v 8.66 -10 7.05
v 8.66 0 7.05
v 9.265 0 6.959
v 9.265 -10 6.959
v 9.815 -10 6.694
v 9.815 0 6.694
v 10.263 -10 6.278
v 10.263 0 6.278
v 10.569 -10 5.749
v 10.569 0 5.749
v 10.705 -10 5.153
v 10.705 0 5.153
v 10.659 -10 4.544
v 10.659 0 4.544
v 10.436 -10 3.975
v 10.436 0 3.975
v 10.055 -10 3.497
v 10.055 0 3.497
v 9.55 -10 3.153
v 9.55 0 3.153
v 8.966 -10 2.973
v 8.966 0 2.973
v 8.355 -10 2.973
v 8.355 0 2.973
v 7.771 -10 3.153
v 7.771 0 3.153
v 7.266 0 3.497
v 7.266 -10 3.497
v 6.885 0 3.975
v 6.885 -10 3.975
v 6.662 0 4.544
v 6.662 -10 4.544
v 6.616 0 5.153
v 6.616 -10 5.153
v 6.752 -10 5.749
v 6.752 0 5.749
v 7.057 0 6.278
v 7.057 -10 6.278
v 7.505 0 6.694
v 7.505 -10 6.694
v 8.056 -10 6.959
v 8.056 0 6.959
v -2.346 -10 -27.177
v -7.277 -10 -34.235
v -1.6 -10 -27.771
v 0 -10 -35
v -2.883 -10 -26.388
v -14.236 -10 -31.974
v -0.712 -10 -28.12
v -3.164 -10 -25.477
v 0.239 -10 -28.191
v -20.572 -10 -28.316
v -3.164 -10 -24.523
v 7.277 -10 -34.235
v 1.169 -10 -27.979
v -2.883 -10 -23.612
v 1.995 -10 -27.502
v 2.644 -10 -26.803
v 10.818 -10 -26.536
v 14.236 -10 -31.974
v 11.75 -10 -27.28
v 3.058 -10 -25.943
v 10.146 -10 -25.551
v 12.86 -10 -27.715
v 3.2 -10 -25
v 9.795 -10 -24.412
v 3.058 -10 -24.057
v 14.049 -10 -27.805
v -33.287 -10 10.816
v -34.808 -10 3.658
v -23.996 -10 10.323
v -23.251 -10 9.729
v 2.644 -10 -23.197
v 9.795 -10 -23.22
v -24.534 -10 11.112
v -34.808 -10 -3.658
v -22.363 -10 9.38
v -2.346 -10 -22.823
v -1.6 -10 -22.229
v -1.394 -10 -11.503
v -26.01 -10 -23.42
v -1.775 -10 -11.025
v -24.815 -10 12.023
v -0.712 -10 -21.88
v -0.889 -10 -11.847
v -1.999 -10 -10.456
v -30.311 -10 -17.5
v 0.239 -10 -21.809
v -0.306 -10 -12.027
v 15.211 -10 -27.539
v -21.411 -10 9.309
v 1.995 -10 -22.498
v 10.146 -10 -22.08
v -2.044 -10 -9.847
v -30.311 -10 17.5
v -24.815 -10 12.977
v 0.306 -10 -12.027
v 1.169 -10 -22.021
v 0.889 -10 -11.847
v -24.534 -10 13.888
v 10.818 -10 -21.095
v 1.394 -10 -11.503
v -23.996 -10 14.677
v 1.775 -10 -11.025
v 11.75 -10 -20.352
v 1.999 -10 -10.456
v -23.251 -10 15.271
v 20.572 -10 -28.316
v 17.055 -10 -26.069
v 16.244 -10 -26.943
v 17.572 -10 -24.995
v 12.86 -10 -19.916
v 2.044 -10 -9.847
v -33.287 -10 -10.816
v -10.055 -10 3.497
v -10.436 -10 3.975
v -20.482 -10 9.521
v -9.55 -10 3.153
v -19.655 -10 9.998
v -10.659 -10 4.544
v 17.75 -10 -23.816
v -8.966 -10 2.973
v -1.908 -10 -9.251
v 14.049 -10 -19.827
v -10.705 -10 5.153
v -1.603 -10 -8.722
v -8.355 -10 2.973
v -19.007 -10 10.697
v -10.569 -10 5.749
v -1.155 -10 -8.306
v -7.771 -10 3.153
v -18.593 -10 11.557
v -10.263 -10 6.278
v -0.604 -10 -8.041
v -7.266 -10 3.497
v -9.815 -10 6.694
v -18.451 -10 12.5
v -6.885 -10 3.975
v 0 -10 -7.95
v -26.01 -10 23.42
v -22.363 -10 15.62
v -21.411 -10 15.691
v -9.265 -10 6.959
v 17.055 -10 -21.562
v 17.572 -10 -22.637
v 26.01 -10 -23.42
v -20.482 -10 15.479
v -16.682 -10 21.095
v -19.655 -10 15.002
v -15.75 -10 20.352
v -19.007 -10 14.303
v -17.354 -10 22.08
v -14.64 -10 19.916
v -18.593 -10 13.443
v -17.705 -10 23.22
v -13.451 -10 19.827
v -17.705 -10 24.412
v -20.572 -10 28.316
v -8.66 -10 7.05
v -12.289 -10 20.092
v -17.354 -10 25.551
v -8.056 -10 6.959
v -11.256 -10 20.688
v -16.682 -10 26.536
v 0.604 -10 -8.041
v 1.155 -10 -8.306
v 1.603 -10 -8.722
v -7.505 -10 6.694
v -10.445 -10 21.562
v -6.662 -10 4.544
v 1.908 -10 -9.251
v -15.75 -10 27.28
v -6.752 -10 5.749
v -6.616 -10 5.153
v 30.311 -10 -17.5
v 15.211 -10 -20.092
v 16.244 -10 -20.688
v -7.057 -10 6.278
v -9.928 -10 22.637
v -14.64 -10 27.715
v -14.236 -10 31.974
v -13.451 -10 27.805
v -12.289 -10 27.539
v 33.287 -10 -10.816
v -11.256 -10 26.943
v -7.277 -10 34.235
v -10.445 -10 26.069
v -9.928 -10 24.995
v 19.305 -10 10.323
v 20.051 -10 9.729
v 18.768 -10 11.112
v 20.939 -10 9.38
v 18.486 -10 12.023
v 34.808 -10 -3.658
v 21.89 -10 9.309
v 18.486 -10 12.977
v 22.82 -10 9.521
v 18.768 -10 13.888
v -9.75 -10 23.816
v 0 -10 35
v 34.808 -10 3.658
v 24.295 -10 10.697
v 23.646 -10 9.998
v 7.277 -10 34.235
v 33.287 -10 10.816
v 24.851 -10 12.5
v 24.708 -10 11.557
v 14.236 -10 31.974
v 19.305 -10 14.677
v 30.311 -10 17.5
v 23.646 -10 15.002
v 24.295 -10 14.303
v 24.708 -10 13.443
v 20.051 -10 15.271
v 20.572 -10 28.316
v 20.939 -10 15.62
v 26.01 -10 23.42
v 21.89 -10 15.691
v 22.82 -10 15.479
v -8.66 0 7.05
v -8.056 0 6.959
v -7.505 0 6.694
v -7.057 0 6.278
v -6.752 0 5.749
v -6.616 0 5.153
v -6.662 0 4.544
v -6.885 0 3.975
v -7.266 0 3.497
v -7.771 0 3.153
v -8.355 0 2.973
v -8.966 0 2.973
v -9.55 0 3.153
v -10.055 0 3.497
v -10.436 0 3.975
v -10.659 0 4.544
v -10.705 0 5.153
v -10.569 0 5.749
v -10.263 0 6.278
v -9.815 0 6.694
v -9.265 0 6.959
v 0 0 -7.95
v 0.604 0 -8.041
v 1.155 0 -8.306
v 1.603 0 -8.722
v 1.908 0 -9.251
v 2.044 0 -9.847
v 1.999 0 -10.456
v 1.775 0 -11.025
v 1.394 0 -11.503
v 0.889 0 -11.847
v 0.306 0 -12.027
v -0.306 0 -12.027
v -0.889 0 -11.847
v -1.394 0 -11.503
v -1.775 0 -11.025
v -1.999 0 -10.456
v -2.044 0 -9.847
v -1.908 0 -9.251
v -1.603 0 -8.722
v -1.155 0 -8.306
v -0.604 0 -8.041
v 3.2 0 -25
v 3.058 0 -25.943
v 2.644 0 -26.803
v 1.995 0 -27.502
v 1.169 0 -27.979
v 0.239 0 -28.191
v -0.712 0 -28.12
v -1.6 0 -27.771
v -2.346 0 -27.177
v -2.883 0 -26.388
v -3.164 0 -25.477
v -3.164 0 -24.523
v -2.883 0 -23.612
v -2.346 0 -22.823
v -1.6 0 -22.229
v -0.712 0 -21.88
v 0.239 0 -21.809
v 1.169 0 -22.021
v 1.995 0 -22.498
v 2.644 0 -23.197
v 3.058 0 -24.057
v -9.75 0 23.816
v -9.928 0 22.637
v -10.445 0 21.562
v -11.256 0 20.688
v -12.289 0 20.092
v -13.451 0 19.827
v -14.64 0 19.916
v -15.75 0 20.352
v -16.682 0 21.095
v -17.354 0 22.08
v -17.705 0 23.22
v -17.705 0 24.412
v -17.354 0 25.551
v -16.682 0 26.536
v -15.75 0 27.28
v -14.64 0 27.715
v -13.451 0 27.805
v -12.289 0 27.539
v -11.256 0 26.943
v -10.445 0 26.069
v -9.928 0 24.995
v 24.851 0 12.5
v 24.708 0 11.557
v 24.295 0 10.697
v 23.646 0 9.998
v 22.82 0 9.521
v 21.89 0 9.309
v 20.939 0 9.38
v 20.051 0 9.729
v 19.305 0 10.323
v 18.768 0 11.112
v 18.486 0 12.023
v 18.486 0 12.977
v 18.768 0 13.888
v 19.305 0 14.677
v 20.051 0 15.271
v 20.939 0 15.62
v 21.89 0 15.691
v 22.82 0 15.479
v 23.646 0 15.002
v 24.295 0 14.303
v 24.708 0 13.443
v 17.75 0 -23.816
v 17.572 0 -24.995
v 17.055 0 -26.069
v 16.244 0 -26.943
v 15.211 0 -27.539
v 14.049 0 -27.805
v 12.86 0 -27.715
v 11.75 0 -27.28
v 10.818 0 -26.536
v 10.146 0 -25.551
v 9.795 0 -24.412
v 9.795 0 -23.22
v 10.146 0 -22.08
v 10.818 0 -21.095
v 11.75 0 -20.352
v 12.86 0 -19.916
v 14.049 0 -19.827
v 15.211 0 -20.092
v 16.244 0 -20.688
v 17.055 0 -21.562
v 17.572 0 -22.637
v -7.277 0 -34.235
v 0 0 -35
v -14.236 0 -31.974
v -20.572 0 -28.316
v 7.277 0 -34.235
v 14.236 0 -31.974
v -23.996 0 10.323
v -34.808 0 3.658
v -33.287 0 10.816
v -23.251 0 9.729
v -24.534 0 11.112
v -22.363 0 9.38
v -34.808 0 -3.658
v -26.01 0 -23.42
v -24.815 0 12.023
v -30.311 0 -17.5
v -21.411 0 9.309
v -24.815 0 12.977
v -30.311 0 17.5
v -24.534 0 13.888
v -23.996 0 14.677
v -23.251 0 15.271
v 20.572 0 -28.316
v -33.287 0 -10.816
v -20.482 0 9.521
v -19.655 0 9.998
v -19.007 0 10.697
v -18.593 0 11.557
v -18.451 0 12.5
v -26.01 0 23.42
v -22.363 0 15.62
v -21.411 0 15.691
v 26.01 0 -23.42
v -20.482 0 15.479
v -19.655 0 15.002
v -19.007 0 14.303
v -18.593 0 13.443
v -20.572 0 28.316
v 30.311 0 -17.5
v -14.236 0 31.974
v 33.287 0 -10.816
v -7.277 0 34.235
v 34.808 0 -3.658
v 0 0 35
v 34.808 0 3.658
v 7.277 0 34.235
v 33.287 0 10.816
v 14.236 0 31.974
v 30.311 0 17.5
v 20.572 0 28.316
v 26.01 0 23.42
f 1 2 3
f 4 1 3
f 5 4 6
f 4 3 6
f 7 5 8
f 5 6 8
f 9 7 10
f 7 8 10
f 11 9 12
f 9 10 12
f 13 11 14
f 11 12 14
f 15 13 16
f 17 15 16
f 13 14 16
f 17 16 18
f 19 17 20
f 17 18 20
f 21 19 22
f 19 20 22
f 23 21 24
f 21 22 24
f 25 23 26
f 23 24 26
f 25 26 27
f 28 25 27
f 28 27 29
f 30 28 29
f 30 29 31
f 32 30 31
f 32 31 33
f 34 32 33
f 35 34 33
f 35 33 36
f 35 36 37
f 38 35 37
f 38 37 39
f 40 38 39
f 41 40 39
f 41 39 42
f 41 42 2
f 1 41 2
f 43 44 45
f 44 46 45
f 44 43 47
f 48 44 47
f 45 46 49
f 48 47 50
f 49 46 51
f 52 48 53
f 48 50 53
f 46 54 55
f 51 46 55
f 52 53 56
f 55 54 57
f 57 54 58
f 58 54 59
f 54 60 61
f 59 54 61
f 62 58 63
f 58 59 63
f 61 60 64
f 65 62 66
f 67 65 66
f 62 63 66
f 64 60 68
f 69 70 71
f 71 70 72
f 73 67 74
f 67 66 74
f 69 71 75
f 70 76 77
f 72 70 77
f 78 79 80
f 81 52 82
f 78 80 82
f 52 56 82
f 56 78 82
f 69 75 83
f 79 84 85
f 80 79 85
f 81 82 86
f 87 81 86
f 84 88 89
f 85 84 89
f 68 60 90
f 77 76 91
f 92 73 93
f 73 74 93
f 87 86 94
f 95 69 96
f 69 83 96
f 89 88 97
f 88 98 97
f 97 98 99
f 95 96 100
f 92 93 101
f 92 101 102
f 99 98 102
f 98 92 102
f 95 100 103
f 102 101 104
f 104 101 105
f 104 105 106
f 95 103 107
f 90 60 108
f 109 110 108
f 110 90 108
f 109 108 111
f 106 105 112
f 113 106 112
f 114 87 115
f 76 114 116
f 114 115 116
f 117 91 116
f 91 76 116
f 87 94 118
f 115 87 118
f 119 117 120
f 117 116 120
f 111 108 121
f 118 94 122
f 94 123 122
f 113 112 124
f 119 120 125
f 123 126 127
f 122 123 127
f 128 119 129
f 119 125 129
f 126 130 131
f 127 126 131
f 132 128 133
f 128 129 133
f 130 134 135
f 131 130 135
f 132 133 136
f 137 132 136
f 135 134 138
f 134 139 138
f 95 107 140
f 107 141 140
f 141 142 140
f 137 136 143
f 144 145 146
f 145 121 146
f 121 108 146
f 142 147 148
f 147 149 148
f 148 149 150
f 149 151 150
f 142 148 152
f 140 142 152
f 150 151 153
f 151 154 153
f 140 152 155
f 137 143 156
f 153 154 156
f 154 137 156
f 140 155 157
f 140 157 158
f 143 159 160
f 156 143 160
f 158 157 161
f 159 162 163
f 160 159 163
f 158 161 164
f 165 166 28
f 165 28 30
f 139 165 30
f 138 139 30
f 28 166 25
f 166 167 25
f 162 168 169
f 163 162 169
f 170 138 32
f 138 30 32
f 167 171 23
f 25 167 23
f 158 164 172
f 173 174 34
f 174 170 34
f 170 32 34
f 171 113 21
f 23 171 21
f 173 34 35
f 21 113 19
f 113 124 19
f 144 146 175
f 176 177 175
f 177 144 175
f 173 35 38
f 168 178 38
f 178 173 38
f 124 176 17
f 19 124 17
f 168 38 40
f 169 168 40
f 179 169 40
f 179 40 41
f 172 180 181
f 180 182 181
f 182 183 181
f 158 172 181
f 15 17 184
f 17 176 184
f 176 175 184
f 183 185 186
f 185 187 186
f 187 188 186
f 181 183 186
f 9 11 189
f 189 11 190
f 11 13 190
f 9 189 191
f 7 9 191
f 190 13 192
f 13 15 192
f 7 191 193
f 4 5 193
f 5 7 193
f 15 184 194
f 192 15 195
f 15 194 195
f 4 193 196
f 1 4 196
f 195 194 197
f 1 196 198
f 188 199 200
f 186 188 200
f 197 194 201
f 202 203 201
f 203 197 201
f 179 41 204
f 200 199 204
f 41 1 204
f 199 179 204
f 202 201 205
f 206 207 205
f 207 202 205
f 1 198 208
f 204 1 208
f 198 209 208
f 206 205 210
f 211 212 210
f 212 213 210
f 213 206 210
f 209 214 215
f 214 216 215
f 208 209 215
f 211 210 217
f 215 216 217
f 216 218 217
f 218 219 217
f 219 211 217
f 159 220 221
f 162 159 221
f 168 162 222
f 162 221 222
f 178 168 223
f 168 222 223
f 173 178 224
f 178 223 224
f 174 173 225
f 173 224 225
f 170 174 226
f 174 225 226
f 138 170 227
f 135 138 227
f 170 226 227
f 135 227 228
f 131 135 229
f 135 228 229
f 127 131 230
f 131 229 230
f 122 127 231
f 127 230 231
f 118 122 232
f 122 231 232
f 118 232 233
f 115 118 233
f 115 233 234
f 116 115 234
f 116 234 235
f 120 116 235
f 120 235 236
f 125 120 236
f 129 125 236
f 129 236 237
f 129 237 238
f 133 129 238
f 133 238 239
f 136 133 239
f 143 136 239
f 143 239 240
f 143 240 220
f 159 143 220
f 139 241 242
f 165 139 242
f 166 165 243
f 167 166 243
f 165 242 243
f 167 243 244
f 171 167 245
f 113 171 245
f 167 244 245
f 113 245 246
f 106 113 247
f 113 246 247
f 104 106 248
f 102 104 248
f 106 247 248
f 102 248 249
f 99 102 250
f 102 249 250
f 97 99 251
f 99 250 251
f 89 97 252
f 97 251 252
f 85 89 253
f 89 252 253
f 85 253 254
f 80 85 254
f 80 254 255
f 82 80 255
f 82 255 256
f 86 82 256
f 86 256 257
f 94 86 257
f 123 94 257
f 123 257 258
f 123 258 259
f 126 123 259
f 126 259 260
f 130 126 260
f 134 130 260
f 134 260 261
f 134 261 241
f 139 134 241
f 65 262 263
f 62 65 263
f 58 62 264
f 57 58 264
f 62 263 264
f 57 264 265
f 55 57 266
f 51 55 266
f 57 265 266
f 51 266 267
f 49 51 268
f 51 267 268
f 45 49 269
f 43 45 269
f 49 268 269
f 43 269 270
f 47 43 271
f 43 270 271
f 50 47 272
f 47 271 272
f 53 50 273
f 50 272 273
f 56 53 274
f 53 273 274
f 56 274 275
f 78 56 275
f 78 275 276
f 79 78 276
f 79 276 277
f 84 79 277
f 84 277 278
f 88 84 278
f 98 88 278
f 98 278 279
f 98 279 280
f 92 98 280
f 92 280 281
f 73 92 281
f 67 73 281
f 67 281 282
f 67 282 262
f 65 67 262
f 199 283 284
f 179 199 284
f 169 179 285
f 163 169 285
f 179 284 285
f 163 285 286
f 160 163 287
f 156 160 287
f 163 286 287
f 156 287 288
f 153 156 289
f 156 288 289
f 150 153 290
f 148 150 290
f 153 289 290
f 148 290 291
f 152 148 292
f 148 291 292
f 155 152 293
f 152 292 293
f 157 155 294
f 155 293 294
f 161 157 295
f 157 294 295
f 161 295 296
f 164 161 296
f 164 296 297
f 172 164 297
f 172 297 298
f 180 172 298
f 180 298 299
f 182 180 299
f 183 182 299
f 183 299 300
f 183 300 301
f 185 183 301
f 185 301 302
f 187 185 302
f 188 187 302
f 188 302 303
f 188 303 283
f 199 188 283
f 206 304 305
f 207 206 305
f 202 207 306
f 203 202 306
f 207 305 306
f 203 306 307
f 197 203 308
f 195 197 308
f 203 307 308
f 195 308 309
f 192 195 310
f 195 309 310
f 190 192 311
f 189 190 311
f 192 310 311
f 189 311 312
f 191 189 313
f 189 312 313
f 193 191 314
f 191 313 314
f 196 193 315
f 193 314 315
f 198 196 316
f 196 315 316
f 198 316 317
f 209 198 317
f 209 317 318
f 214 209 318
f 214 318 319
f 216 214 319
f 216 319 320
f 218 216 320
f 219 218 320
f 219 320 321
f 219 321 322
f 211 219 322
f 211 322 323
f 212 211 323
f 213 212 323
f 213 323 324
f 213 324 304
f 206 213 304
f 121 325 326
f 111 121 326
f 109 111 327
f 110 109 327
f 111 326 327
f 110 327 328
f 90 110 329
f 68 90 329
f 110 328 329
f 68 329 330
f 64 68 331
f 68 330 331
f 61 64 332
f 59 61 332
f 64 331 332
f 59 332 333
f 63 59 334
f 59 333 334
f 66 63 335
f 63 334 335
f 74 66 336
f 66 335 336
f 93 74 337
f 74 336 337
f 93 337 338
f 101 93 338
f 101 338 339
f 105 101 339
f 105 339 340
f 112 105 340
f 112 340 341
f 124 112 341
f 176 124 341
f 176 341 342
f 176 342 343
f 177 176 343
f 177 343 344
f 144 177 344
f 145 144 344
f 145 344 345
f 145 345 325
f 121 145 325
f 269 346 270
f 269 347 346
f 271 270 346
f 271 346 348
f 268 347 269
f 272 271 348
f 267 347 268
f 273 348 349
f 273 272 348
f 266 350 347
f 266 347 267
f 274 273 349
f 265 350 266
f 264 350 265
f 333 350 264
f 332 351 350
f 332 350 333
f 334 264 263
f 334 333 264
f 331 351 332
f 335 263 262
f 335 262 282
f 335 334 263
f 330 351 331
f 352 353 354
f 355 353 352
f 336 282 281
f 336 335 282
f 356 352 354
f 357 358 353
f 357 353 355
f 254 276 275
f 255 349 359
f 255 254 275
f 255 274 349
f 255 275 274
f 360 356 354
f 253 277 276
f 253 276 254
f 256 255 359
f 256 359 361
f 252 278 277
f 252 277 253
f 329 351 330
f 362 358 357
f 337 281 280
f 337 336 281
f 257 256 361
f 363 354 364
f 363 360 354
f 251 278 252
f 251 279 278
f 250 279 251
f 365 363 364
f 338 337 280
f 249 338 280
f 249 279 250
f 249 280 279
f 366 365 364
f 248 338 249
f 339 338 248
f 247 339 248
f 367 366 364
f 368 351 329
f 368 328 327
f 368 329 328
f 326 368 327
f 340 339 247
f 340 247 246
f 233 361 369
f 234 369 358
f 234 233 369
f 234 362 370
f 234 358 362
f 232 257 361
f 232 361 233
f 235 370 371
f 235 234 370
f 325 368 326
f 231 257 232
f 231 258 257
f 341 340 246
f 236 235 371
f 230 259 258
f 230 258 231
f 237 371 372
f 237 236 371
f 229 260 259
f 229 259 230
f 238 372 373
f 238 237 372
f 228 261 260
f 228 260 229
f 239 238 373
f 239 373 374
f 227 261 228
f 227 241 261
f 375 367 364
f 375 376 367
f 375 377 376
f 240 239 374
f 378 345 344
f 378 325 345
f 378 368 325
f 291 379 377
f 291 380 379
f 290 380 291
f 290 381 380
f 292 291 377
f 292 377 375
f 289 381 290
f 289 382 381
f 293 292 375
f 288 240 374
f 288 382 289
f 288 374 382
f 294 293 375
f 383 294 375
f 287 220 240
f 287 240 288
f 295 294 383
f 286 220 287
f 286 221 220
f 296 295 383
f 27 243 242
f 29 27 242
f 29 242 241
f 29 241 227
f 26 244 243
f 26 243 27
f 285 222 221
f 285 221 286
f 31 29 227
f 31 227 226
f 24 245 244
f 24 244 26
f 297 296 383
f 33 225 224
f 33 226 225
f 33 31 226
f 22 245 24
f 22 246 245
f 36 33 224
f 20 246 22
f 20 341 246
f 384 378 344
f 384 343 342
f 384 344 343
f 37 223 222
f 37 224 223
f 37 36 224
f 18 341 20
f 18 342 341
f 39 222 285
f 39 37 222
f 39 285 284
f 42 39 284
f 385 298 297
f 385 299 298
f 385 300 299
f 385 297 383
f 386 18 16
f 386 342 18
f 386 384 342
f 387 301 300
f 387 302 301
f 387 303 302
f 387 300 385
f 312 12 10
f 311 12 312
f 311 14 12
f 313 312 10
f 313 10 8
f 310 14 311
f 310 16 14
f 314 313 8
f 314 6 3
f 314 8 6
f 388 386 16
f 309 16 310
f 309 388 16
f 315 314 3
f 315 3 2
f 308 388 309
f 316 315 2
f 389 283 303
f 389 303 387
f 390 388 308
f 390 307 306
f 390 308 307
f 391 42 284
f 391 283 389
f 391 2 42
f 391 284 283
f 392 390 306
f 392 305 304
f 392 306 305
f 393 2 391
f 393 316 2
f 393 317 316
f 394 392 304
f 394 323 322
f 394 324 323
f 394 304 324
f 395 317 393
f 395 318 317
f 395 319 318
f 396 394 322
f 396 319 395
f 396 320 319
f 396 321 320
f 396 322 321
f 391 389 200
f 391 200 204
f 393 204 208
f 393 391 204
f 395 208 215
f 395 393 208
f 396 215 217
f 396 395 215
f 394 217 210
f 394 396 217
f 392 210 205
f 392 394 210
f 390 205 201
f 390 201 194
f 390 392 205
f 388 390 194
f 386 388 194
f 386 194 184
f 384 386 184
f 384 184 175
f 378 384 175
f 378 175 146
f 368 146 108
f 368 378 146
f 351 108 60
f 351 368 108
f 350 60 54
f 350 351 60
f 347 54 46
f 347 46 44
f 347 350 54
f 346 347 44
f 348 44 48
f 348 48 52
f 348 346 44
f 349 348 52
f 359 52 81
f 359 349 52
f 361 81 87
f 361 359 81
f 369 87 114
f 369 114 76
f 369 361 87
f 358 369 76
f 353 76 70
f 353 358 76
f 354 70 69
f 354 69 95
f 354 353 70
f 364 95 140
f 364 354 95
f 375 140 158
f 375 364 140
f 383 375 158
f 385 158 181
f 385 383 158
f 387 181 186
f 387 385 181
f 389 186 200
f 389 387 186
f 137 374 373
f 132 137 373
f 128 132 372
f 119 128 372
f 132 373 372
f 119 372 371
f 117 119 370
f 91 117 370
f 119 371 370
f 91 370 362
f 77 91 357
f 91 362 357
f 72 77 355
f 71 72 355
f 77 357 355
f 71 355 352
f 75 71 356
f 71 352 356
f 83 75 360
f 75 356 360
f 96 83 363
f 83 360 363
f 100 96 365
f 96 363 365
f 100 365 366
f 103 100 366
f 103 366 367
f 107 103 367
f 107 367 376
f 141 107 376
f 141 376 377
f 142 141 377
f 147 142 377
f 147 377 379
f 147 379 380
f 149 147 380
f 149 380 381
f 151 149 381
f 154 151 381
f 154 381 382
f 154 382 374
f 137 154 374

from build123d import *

# Parameters (mm, degrees)
SKETCH1_R             = 35
BOSS_EXTRUDE1_DEPTH   = 10
CUT_EXTRUDE1_REACH    = 52.498
SKETCH2_R             = 2.05
F_8_0MM_DOWEL_HOLE1_D = 8
M6_CLEARANCE_HOLE1_D  = 6.4


with BuildPart() as part:
    # Sketch1 → Boss-Extrude1 (new body)
    with BuildSketch(Plane(origin=(0, 0, 0), x_dir=(1, 0, 0), z_dir=(0, 1, 0))):
        with Locations(Location((0, 0, 0), (0, 0, 270))):
            Circle(SKETCH1_R)
    extrude(amount=-BOSS_EXTRUDE1_DEPTH)

    # Sketch2 → Cut-Extrude1 (cut, up to next)
    with BuildSketch(Plane(origin=(0, 0, 0), x_dir=(1, 0, 0), z_dir=(0, 1, 0)), mode=Mode.PRIVATE) as cut_extrude1_sk1:
        with Locations(Location((8.660254038, -5, 0), (0, 0, 270))):
            Circle(SKETCH2_R)
    cut_extrude1_tool1 = extrude(cut_extrude1_sk1.sketch, amount=-CUT_EXTRUDE1_REACH, mode=Mode.PRIVATE) & part.part
    # Sketch2 → Cut-Extrude1 (cut, up to next)
    with BuildSketch(Plane(origin=(0, 0, 0), x_dir=(1, 0, 0), z_dir=(0, 1, 0)), mode=Mode.PRIVATE) as cut_extrude1_sk2:
        with Locations(Location((0, 10, 0), (0, 0, 270))):
            Circle(SKETCH2_R)
    cut_extrude1_tool2 = extrude(cut_extrude1_sk2.sketch, amount=-CUT_EXTRUDE1_REACH, mode=Mode.PRIVATE) & part.part
    # Sketch2 → Cut-Extrude1 (cut, up to next)
    with BuildSketch(Plane(origin=(0, 0, 0), x_dir=(1, 0, 0), z_dir=(0, 1, 0)), mode=Mode.PRIVATE) as cut_extrude1_sk3:
        with Locations(Location((-8.660254038, -5, 0), (0, 0, 270))):
            Circle(SKETCH2_R)
    cut_extrude1_tool3 = extrude(cut_extrude1_sk3.sketch, amount=-CUT_EXTRUDE1_REACH, mode=Mode.PRIVATE) & part.part
    add(cut_extrude1_tool1.solids().sort_by_distance((8.660254, 0, 5))[0], mode=Mode.SUBTRACT)
    add(cut_extrude1_tool2.solids().sort_by_distance((0, 0, -10))[0], mode=Mode.SUBTRACT)
    add(cut_extrude1_tool3.solids().sort_by_distance((-8.660254, 0, 5))[0], mode=Mode.SUBTRACT)

    # Ø8.0mm Dowel Hole1 (through all)
    with Locations(Plane(origin=(0, -10, 0), x_dir=(-1, 0, 0), z_dir=(0, -1, 0))):
        with Locations((-13.75, 23.815698604), (13.75, -23.815698604)):
            Hole(F_8_0MM_DOWEL_HOLE1_D / 2)

    # M6 Clearance Hole1 (through all)
    with Locations(Plane(origin=(0, -10, 0), x_dir=(-1, 0, 0), z_dir=(0, -1, 0))):
        with Locations((-21.650635095, -12.5), (21.650635095, -12.5), (0, 25)):
            Hole(M6_CLEARANCE_HOLE1_D / 2)


solid = part.part
